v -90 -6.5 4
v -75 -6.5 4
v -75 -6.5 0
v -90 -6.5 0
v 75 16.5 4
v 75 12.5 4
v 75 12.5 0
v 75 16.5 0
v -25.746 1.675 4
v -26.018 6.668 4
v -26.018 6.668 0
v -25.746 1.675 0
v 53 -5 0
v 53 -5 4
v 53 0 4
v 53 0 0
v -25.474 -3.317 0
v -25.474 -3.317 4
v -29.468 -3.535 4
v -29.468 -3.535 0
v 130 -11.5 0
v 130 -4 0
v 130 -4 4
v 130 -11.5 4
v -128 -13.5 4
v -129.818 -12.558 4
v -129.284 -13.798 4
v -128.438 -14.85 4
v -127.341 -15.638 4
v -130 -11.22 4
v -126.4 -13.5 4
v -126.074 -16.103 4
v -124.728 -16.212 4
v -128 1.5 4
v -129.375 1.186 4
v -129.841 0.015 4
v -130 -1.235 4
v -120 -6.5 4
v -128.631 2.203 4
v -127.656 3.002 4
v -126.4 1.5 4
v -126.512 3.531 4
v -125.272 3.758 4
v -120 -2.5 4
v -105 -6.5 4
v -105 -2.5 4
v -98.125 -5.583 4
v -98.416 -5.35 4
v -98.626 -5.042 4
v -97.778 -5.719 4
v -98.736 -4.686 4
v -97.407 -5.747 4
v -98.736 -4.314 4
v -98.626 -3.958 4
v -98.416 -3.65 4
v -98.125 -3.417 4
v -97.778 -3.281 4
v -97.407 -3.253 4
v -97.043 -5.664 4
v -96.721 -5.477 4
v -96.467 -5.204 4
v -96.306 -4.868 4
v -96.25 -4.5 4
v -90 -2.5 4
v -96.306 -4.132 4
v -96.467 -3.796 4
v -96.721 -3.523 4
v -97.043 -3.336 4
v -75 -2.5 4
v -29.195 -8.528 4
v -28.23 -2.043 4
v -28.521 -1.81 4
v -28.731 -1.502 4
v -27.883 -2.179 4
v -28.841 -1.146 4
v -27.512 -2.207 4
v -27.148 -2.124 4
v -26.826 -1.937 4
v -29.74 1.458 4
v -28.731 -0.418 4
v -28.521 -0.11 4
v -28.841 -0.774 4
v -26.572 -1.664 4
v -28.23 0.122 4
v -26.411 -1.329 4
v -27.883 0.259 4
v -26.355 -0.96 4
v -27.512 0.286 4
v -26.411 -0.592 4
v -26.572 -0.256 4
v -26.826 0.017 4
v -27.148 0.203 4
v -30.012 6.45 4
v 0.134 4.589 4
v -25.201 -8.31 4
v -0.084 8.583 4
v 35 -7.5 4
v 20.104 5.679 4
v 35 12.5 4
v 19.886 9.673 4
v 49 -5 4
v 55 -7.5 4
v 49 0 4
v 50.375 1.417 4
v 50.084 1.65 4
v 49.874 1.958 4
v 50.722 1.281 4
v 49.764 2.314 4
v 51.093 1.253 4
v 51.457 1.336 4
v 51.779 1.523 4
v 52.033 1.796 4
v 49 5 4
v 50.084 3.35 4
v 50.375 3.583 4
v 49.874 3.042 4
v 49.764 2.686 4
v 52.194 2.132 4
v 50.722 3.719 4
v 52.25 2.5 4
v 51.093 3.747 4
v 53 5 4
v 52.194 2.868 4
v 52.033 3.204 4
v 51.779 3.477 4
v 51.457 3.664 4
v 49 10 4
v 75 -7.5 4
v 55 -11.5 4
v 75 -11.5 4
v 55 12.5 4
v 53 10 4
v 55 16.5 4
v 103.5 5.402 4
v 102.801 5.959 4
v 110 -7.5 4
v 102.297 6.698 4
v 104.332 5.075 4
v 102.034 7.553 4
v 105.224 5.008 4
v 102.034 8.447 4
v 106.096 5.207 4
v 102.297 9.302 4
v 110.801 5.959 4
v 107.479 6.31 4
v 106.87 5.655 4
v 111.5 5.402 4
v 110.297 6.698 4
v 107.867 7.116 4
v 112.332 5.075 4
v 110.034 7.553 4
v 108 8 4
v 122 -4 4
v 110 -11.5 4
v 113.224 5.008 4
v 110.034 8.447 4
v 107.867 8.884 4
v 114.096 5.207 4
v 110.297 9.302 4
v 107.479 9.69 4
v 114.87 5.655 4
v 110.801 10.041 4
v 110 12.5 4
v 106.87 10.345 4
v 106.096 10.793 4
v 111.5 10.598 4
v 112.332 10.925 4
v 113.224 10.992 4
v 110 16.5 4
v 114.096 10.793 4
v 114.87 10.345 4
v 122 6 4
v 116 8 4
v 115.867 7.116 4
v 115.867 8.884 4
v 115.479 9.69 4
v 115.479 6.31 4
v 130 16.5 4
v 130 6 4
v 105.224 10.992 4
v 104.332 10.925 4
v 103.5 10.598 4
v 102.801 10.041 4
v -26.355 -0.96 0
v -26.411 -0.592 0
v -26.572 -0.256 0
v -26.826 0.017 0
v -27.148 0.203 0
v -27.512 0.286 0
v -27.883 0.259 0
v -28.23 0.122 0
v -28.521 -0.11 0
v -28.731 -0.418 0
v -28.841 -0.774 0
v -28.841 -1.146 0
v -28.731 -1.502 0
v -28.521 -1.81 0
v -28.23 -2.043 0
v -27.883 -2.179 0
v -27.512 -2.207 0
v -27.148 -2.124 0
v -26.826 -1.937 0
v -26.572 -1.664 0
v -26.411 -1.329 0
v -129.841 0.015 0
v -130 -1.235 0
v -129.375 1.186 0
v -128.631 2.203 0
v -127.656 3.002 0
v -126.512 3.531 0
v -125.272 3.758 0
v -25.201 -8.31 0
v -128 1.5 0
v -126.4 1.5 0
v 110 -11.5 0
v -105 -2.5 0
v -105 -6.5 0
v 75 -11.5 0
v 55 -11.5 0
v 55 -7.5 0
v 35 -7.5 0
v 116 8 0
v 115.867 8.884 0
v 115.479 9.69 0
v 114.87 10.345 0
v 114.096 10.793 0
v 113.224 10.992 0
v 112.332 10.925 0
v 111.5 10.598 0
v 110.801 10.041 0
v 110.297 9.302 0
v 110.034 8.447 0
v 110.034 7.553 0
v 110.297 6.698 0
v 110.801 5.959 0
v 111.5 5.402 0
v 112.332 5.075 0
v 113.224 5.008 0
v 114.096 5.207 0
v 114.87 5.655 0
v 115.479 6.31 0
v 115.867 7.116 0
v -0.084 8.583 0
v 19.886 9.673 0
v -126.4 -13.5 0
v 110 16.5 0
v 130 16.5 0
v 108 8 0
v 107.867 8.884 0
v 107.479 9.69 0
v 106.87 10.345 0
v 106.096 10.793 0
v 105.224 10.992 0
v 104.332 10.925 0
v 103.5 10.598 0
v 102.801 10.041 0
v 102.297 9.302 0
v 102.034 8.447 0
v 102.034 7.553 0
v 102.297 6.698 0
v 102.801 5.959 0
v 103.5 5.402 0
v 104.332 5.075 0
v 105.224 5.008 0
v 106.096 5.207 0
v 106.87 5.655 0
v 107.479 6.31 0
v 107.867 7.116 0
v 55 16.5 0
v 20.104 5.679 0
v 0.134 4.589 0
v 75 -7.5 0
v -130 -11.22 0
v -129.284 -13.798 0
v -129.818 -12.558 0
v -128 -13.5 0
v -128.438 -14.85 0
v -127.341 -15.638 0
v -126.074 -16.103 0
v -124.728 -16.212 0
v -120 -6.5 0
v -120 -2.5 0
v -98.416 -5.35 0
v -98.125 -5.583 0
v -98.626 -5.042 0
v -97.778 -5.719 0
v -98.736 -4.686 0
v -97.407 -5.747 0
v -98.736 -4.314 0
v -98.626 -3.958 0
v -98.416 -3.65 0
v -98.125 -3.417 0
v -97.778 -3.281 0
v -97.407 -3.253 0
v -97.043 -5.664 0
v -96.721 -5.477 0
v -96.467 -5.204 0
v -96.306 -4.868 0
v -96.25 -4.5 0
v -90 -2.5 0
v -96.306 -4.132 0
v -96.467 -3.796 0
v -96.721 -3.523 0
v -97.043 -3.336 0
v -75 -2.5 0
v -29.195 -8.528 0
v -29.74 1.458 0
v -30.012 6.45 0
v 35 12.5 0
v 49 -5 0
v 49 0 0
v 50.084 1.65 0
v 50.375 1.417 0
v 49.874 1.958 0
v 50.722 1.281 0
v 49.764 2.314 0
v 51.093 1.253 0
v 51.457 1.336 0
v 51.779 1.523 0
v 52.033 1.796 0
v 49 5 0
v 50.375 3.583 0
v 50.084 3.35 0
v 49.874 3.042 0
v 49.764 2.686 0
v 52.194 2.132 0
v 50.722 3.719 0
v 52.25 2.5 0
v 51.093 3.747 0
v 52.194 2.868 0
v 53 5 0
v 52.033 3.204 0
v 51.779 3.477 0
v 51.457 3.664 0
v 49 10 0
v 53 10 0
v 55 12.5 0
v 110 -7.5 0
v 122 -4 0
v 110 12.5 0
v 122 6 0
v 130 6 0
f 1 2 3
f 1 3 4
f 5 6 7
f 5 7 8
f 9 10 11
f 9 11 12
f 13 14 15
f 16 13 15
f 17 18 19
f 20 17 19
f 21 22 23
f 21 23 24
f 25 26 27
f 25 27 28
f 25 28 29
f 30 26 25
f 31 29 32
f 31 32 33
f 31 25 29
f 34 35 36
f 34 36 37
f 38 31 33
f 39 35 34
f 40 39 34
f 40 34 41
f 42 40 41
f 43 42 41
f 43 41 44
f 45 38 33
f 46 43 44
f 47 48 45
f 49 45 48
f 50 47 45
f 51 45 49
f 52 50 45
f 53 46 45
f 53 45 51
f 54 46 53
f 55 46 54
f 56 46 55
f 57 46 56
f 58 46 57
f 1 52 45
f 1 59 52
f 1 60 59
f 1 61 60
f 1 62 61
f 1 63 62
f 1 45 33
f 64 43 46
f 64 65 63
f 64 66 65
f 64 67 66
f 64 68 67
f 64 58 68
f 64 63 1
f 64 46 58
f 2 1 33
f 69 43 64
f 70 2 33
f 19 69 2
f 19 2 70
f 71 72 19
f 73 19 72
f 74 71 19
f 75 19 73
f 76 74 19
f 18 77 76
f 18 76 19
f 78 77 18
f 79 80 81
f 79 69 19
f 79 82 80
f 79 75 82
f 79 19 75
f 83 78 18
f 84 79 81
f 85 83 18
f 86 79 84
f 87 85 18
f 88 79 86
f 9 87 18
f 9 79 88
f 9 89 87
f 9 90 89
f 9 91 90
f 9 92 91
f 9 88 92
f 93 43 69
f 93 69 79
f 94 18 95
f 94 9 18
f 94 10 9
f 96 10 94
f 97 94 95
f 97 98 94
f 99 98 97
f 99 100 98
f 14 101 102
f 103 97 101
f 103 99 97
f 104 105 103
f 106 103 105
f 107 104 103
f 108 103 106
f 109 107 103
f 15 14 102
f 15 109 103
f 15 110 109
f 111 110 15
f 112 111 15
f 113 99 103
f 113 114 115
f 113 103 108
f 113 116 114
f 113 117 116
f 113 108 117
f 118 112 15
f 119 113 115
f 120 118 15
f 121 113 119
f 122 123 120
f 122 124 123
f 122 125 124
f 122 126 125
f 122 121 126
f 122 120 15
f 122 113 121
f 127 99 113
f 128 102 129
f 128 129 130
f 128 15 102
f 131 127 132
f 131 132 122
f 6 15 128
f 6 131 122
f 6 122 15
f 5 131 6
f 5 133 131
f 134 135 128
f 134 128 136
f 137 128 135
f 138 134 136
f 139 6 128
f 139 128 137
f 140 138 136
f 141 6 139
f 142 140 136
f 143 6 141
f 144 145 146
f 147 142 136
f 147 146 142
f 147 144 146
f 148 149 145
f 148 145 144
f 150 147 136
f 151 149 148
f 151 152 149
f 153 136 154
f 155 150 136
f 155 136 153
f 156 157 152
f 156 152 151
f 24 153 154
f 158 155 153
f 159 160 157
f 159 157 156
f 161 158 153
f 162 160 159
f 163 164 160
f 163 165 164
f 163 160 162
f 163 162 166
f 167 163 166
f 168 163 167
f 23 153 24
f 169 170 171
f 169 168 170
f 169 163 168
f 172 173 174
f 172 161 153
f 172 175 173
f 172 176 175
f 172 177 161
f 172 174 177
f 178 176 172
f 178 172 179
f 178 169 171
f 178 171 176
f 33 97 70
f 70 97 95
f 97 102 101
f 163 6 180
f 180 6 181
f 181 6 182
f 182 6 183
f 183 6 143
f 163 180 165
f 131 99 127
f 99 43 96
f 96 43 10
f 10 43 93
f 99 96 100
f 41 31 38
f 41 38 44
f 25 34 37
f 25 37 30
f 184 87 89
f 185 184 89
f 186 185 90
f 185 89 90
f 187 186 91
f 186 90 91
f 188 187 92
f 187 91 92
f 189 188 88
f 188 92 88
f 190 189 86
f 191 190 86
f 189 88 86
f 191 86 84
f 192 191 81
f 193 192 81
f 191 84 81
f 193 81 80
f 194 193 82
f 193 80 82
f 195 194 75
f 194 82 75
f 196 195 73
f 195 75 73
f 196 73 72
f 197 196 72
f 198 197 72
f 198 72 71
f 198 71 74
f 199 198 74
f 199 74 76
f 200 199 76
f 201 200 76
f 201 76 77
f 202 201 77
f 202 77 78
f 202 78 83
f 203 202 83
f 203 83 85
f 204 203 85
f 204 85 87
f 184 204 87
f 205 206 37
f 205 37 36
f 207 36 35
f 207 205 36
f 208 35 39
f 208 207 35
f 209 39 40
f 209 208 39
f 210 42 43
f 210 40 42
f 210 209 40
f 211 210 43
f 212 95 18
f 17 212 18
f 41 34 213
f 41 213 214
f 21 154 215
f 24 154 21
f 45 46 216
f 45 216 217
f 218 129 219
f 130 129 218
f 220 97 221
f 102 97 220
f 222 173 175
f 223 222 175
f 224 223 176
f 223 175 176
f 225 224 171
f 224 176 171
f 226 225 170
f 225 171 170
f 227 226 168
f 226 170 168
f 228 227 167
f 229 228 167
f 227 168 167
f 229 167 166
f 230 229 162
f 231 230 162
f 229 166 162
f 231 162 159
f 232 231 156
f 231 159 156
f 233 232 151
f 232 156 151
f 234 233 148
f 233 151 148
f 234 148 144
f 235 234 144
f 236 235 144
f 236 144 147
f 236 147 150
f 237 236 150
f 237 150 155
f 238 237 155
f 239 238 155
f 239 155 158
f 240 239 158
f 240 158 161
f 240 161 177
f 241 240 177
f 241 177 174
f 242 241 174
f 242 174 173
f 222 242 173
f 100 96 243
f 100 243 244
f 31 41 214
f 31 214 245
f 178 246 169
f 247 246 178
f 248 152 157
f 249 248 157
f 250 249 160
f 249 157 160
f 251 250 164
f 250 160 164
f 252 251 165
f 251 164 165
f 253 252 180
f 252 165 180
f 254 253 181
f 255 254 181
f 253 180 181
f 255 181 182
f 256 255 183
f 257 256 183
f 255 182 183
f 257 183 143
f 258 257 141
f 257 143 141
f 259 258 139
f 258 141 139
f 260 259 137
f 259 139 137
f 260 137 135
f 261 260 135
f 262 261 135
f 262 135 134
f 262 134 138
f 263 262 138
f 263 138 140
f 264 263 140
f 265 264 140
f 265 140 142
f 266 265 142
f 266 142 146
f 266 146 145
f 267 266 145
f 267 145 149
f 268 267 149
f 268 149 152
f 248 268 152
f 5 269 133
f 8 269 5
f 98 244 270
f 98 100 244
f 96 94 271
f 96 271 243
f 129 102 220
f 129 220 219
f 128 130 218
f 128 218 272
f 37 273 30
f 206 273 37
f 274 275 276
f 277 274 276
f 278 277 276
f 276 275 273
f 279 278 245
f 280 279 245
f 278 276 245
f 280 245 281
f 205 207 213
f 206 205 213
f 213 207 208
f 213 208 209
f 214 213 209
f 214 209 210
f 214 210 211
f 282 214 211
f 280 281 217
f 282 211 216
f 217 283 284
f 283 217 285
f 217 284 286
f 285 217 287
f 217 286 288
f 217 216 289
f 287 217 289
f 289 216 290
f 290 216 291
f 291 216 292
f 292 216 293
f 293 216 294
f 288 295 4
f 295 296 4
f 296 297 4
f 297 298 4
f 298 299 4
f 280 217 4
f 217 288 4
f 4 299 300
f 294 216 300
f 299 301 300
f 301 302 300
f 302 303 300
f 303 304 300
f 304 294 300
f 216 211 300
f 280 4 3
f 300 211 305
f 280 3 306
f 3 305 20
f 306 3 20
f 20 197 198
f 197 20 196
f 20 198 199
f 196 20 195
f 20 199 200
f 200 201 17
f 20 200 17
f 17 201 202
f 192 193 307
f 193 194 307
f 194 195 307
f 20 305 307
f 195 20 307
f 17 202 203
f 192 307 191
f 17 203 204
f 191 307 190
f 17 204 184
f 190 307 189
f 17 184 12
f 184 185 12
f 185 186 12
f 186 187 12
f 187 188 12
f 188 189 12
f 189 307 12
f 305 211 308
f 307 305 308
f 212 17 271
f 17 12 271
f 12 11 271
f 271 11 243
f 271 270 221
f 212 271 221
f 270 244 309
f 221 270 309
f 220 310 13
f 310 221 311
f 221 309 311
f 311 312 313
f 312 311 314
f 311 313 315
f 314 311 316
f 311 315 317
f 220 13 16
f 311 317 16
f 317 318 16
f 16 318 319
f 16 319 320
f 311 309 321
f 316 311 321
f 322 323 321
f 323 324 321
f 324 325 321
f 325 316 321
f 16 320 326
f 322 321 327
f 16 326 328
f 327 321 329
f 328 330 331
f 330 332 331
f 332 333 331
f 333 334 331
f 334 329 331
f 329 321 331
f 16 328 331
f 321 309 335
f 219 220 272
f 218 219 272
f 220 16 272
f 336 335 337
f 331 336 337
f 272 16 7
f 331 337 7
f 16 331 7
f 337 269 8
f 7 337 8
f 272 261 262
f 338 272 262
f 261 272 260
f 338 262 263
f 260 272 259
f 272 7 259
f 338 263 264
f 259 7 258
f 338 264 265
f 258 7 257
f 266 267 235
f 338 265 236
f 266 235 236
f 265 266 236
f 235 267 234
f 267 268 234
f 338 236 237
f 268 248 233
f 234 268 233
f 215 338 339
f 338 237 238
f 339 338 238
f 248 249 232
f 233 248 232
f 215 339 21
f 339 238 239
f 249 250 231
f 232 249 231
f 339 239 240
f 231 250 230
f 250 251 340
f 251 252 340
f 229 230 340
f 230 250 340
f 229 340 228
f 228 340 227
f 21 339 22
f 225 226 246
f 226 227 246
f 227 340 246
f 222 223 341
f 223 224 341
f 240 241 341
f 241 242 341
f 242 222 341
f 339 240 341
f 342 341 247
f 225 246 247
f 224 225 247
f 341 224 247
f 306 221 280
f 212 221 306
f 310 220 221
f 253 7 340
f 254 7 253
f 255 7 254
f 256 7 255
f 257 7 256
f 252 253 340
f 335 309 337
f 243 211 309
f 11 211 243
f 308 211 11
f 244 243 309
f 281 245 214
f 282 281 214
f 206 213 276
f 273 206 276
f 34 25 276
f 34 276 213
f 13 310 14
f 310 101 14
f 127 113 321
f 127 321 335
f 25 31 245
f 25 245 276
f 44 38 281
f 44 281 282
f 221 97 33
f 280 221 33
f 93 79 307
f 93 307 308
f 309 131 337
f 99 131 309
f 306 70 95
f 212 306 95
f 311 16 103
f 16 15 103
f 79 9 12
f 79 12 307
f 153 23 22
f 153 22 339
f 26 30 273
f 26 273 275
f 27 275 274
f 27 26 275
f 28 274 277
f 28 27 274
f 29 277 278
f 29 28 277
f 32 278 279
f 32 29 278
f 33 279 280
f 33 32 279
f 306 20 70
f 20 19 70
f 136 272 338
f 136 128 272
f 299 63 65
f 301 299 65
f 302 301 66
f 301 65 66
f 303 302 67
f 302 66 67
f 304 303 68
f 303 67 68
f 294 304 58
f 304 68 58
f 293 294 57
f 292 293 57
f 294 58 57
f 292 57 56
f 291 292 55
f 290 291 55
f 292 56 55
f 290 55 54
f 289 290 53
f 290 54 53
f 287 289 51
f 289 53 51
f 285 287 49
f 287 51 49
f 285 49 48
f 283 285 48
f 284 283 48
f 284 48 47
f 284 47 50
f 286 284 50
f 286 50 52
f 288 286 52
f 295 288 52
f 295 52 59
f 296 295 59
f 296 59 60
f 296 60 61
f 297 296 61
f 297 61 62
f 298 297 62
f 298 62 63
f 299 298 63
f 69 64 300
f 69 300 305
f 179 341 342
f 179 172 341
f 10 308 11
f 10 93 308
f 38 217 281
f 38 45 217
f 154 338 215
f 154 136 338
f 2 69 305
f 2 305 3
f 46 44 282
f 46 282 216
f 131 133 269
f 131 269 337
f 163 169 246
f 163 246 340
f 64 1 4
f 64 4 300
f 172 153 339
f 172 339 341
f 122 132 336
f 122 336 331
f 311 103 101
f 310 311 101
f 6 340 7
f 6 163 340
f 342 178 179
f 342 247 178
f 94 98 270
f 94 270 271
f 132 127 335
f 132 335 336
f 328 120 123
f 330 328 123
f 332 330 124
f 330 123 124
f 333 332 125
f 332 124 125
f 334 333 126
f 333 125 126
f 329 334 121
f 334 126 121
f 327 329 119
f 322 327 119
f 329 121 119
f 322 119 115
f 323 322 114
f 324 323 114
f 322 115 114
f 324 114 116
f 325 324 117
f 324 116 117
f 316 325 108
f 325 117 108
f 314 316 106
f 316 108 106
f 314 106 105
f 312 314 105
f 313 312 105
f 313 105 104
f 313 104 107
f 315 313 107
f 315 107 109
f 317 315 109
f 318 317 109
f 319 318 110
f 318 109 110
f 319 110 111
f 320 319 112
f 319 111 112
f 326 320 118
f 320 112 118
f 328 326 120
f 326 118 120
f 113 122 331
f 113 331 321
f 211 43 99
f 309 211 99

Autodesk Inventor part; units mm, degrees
ref_plane "YZ Plane" through (0, 0, 0) normal (1, 0, 0) x (0, 1, 0)
ref_plane "XZ Plane" through (0, 0, 0) normal (0, 1, 0) x (-1, 0, 0)
ref_plane "XY Plane" through (0, 0, 0) normal (0, 0, 1) x (1, 0, 0)
sketch "Sketch1" plane through (0, 0, 0) normal (0, 0, 1) x (1, 0, 0)
  line L0 (-130, 16.5) -> (130, 16.5)
  line L1 (130, 16.5) -> (130, -16.5)
  line L2 (130, -16.5) -> (-130, -16.5)
  line L3 (-130, -16.5) -> (-130, 16.5)
  point P0 (0, 0)
  dimension "d0" = 260
  dimension "d1" = 33
  dimension "d2" = 16.5
  dimension "d3" = 130
extrude "Base" add sketch "Sketch1" along normal blind 4
sketch "Sketch2" plane through (0, 0, 4) normal (0, 0, 1) x (1, 0, 0)
  line L0 (130, 16.5) -> (130, -16.5) projected
  line L1 (-130, 16.5) -> (130, 16.5) projected
  line L2 (-130, -16.5) -> (-130, 16.5) projected
  line L3 (130, -16.5) -> (-130, -16.5) projected
  line L4 (75, 16.5) -> (110, 16.5)
  line L5 (110, 16.5) -> (110, 12.5)
  line L6 (110, 12.5) -> (75, 12.5)
  line L7 (75, 12.5) -> (75, 16.5)
  line L8 (-130, 16.5) -> (55, 16.5)
  line L9 (55, 16.5) -> (55, 12.5)
  line L10 (55, 12.5) -> (-130, 12.5)
  line L11 (-130, 12.5) -> (-130, 16.5)
  line L12 (35, -7.5) -> (55, -7.5)
  line L13 (55, -7.5) -> (55, -16.5)
  line L14 (55, -16.5) -> (35, -16.5)
  line L15 (35, -16.5) -> (35, -7.5)
  line L16 (75, -7.5) -> (110, -7.5)
  line L17 (110, -7.5) -> (110, -16.5)
  line L18 (110, -16.5) -> (75, -16.5)
  line L19 (75, -16.5) -> (75, -7.5)
  line L20 (110, -11.5) -> (130, -11.5)
  line L21 (130, -11.5) -> (130, -16.5)
  line L22 (130, -16.5) -> (110, -16.5)
  line L23 (110, -16.5) -> (110, -11.5)
  line L24 (55, -11.5) -> (75, -11.5)
  line L25 (75, -11.5) -> (75, -16.5)
  line L26 (75, -16.5) -> (55, -16.5)
  line L27 (55, -16.5) -> (55, -11.5)
  point P0 (0, 0)
  dimension "d6" = 35
  dimension "d7" = 4
  dimension "d8" = 0
  dimension "d9" = 20
  dimension "d10" = 185
  dimension "d11" = 4
  dimension "d12" = 0
  dimension "d13" = 0
  dimension "d14" = 20
  dimension "d15" = 20
  dimension "d16" = 9
  dimension "d17" = 0
  dimension "d18" = 165
  dimension "d19" = 35
  dimension "d20" = 9
  dimension "d21" = 0
  dimension "d22" = 20
  dimension "d23" = 20
  dimension "d24" = 5
  dimension "d25" = 20
  dimension "d26" = 5
  dimension "d27" = 0
  dimension "d28" = 0
  dimension "d29" = 0
  dimension "d30" = 0
  dimension "d98" = 20
extrude "StructureMounting" cut sketch "Sketch2" against normal blind 4 contours L0 L3 L17 L20 | L5 L6 L7 L1 | L17 L3 L19 L16 | L9 L10 L2 L1 | L3 L13 L24 L19 | L3 L15 L12 L13
sketch "Sketch4" plane through (0, 0, 4) normal (0, 0, 1) x (1, 0, 0)
  line L0 (55, 12.5) -> (-130, 12.5) projected
  line L1 (-130, -16.5) -> (-130, 12.5) projected
  line L2 (35, -16.5) -> (-130, -16.5) projected
  line L3 (35, -16.5) -> (35, -7.5) projected
  line L4 (55, 16.5) -> (55, 12.5) projected
  line L5 (35, -7.5) -> (-130, -16.5)
  line L6 (-130, 3.5) -> (35, 12.5)
  point P0 (0, 0)
  dimension "d42" = 20
  dimension "d43" = 20
extrude "MotorRamp" cut sketch "Sketch4" against normal blind 4
sketch "Sketch5" plane through (0, 0, 4) normal (0, 0, 1) x (1, 0, 0)
  line L0 (110, 12.5) -> (75, 12.5) projected
  line L1 (75, 12.5) -> (75, 16.5) projected
  line L2 (94.274, 12.5) -> (98.274, 12.5)
  line L3 (98.274, 12.5) -> (98.274, 2.5)
  line L4 (98.274, 2.5) -> (94.274, 2.5)
  line L5 (94.274, 2.5) -> (94.274, 12.5)
  line L6 (110, 16.5) -> (110, 12.5) projected
  point P0 (0, 0)
  dimension "d46" = 4
  dimension "d47" = 10
  dimension "d48" = 0
  dimension "d49" = 19.274
  dimension "d100" = 11.726
extrude "LowSleeve" [suppressed]
sketch "Sketch6" plane through (0, 0, 4) normal (0, 0, 1) x (1, 0, 0)
  line L0 (-130, -16.5) -> (-130, 3.5) projected
  line L1 (-120, -2.5) -> (-105, -2.5)
  line L2 (-105, -2.5) -> (-105, -6.5)
  line L3 (-105, -6.5) -> (-120, -6.5)
  line L4 (-120, -6.5) -> (-120, -2.5)
  line L5 (-90, -2.5) -> (-75, -2.5)
  line L6 (-75, -2.5) -> (-75, -6.5)
  line L7 (-75, -6.5) -> (-90, -6.5)
  line L8 (-90, -6.5) -> (-90, -2.5)
  line L9 (98.274, 2.5) -> (94.274, 2.5) projected
  line L10 (-106.4171, -4.5) -> (-87.4505, -4.5) construction
  circle A0 centre (-97.5, -4.5) radius 1.25
  point P0 (0, 0)
  dimension "d63" = 15
  dimension "d64" = 4
  dimension "d67" = 30
  dimension "d72" = 10
  dimension "d73" = 10
  dimension "d166" = 2
  dimension "d167" = 2.5
  dimension "d168" = 7.5
extrude "MotorSleeves" cut sketch "Sketch6" against normal blind 4
sketch "Sketch10" plane through (0, 0, 4) normal (0, 0, 1) x (1, 0, 0)
  line L0 (130, 16.5) -> (130, -11.5) projected
  line L1 (122, 6) -> (130, 6)
  line L2 (130, 6) -> (130, -4)
  line L3 (130, -4) -> (122, -4)
  line L4 (122, -4) -> (122, 6)
  point P0 (0, 0)
  dimension "d109" = 8
  dimension "d110" = 10
  dimension "d111" = 0
  dimension "d112" = 4
extrude "Cabling" cut sketch "Sketch10" against normal blind 4
sketch "Sketch12" plane through (0, 0, 4) normal (0, 0, 1) x (1, 0, 0)
  line L0 (35, 12.5) -> (-130, 3.5) projected
  line L1 (-0.084, 8.5834) -> (19.8863, 9.6726)
  line L2 (19.8863, 9.6726) -> (20.1041, 5.6786)
  line L3 (20.1041, 5.6786) -> (0.1338, 4.5893)
  line L4 (0.1338, 4.5893) -> (-0.084, 8.5834)
  point P0 (0, 0)
  dimension "d124" = 4
  dimension "d125" = 20
  dimension "d126" = 2
  dimension "d127" = 130
extrude "ESCholder" cut sketch "Sketch12" against normal blind 4
sketch "Sketch13" plane through (0, 0, 4) normal (0, 0, 1) x (1, 0, 0)
  line L0 (55, 16.5) -> (55, 12.5) projected
  line L1 (55, 12.5) -> (35, 12.5) projected
  line L2 (35, 12.5) -> (-130, 3.5) projected
  line L3 (-130, -16.5) -> (35, -7.5) projected
  line L4 (-30.0123, 6.4502) -> (-26.0182, 6.668)
  line L5 (-26.0182, 6.668) -> (-25.7459, 1.6754)
  line L6 (-25.7459, 1.6754) -> (-29.7399, 1.4576)
  line L7 (-29.7399, 1.4576) -> (-30.0123, 6.4502)
  line L8 (-47.5366, -2.0169) -> (-6.9954, 0.1945) construction
  line L9 (-29.1953, -8.5276) -> (-25.2012, -8.3097)
  line L10 (-25.2012, -8.3097) -> (-25.4736, -3.3171)
  line L11 (-25.4736, -3.3171) -> (-29.4676, -3.535)
  line L12 (-29.4676, -3.535) -> (-29.1953, -8.5276)
  line L13 (20.1041, 5.6786) -> (0.1338, 4.5893) projected
  line L14 (-27.9377, 5.1382) -> (-27.2725, -7.0585) construction
  circle A0 centre (-27.6051, -0.9601) radius 1.25
  line L15 (49, 10) -> (53, 10)
  line L16 (53, 10) -> (53, 5)
  line L17 (53, 5) -> (49, 5)
  line L18 (49, 5) -> (49, 10)
  line L19 (39.5253, 2.5) -> (63.8345, 2.5) construction
  line L20 (49, -5) -> (53, -5)
  line L21 (53, -5) -> (53, 0)
  line L22 (53, 0) -> (49, 0)
  line L23 (49, 0) -> (49, -5)
  circle A1 centre (51, 2.5) radius 1.25
  point P0 (0, 0)
  dimension "d134" = 2.5
  dimension "d135" = 7.5
  dimension "d136" = 4
  dimension "d137" = 100
  dimension "d140" = 10
  dimension "d151" = 2
  dimension "d152" = 2.5
  dimension "d153" = 4
  dimension "d154" = 5
  dimension "d155" = 2.5
  dimension "d156" = 6
  dimension "d157" = 10
  dimension "d158" = 2.5
  dimension "d159" = 2
extrude "CrossSupports" cut sketch "Sketch13" against normal blind 10
sketch "Sketch14" plane through (0, 0, 4) normal (0, 0, 1) x (1, 0, 0)
  line L0 (110, 12.5) -> (75, 12.5) projected
  circle A0 centre (113, 8) radius 3
  circle A1 centre (105, 8) radius 3
  point P0 (98.274, 12.5)
  point P1 (0, 0)
  dimension "d141" = 6
  dimension "d142" = 6
  dimension "d143" = 4.5
  dimension "d144" = 4.5
  dimension "d145" = 3
  dimension "d146" = 8
extrude "ESCpowerHoles" cut sketch "Sketch14" against normal blind 10
sketch "Sketch15" plane through (0, 0, 4) normal (0, 0, 1) x (1, 0, 0)
  line L0 (75, -7.5) -> (110, -7.5) projected
  line L1 (94.274, 2.5) -> (98.274, 2.5)
  line L2 (98.274, 2.5) -> (98.274, -7.5)
  line L3 (98.274, -7.5) -> (94.274, -7.5)
  line L4 (94.274, -7.5) -> (94.274, 2.5)
  point P0 (0, 0)
extrude "HighSleeve" [suppressed]
sketch "Sketch16" plane through (0, 0, 4) normal (0, 0, 1) x (1, 0, 0)
  line L0 (-130, -16.5) -> (-130, 3.5) projected
  line L1 (-128, 1.5) -> (-126.4, 1.5)
  line L2 (-126.4, 1.5) -> (-126.4, -13.5)
  line L3 (-126.4, -13.5) -> (-128, -13.5)
  line L4 (-128, -13.5) -> (-128, 1.5)
  point P0 (0, 0)
  dimension "d160" = 1.6
  dimension "d161" = 15
  dimension "d162" = 2
  dimension "d163" = 2
extrude "WingLedCutout" cut sketch "Sketch16" against normal blind 10
fillet "ImpactReduction" radius 5 2 edges at (-130, 3.5, 2) (-130, -16.5, 2)
properties part number "ArmOutside"
